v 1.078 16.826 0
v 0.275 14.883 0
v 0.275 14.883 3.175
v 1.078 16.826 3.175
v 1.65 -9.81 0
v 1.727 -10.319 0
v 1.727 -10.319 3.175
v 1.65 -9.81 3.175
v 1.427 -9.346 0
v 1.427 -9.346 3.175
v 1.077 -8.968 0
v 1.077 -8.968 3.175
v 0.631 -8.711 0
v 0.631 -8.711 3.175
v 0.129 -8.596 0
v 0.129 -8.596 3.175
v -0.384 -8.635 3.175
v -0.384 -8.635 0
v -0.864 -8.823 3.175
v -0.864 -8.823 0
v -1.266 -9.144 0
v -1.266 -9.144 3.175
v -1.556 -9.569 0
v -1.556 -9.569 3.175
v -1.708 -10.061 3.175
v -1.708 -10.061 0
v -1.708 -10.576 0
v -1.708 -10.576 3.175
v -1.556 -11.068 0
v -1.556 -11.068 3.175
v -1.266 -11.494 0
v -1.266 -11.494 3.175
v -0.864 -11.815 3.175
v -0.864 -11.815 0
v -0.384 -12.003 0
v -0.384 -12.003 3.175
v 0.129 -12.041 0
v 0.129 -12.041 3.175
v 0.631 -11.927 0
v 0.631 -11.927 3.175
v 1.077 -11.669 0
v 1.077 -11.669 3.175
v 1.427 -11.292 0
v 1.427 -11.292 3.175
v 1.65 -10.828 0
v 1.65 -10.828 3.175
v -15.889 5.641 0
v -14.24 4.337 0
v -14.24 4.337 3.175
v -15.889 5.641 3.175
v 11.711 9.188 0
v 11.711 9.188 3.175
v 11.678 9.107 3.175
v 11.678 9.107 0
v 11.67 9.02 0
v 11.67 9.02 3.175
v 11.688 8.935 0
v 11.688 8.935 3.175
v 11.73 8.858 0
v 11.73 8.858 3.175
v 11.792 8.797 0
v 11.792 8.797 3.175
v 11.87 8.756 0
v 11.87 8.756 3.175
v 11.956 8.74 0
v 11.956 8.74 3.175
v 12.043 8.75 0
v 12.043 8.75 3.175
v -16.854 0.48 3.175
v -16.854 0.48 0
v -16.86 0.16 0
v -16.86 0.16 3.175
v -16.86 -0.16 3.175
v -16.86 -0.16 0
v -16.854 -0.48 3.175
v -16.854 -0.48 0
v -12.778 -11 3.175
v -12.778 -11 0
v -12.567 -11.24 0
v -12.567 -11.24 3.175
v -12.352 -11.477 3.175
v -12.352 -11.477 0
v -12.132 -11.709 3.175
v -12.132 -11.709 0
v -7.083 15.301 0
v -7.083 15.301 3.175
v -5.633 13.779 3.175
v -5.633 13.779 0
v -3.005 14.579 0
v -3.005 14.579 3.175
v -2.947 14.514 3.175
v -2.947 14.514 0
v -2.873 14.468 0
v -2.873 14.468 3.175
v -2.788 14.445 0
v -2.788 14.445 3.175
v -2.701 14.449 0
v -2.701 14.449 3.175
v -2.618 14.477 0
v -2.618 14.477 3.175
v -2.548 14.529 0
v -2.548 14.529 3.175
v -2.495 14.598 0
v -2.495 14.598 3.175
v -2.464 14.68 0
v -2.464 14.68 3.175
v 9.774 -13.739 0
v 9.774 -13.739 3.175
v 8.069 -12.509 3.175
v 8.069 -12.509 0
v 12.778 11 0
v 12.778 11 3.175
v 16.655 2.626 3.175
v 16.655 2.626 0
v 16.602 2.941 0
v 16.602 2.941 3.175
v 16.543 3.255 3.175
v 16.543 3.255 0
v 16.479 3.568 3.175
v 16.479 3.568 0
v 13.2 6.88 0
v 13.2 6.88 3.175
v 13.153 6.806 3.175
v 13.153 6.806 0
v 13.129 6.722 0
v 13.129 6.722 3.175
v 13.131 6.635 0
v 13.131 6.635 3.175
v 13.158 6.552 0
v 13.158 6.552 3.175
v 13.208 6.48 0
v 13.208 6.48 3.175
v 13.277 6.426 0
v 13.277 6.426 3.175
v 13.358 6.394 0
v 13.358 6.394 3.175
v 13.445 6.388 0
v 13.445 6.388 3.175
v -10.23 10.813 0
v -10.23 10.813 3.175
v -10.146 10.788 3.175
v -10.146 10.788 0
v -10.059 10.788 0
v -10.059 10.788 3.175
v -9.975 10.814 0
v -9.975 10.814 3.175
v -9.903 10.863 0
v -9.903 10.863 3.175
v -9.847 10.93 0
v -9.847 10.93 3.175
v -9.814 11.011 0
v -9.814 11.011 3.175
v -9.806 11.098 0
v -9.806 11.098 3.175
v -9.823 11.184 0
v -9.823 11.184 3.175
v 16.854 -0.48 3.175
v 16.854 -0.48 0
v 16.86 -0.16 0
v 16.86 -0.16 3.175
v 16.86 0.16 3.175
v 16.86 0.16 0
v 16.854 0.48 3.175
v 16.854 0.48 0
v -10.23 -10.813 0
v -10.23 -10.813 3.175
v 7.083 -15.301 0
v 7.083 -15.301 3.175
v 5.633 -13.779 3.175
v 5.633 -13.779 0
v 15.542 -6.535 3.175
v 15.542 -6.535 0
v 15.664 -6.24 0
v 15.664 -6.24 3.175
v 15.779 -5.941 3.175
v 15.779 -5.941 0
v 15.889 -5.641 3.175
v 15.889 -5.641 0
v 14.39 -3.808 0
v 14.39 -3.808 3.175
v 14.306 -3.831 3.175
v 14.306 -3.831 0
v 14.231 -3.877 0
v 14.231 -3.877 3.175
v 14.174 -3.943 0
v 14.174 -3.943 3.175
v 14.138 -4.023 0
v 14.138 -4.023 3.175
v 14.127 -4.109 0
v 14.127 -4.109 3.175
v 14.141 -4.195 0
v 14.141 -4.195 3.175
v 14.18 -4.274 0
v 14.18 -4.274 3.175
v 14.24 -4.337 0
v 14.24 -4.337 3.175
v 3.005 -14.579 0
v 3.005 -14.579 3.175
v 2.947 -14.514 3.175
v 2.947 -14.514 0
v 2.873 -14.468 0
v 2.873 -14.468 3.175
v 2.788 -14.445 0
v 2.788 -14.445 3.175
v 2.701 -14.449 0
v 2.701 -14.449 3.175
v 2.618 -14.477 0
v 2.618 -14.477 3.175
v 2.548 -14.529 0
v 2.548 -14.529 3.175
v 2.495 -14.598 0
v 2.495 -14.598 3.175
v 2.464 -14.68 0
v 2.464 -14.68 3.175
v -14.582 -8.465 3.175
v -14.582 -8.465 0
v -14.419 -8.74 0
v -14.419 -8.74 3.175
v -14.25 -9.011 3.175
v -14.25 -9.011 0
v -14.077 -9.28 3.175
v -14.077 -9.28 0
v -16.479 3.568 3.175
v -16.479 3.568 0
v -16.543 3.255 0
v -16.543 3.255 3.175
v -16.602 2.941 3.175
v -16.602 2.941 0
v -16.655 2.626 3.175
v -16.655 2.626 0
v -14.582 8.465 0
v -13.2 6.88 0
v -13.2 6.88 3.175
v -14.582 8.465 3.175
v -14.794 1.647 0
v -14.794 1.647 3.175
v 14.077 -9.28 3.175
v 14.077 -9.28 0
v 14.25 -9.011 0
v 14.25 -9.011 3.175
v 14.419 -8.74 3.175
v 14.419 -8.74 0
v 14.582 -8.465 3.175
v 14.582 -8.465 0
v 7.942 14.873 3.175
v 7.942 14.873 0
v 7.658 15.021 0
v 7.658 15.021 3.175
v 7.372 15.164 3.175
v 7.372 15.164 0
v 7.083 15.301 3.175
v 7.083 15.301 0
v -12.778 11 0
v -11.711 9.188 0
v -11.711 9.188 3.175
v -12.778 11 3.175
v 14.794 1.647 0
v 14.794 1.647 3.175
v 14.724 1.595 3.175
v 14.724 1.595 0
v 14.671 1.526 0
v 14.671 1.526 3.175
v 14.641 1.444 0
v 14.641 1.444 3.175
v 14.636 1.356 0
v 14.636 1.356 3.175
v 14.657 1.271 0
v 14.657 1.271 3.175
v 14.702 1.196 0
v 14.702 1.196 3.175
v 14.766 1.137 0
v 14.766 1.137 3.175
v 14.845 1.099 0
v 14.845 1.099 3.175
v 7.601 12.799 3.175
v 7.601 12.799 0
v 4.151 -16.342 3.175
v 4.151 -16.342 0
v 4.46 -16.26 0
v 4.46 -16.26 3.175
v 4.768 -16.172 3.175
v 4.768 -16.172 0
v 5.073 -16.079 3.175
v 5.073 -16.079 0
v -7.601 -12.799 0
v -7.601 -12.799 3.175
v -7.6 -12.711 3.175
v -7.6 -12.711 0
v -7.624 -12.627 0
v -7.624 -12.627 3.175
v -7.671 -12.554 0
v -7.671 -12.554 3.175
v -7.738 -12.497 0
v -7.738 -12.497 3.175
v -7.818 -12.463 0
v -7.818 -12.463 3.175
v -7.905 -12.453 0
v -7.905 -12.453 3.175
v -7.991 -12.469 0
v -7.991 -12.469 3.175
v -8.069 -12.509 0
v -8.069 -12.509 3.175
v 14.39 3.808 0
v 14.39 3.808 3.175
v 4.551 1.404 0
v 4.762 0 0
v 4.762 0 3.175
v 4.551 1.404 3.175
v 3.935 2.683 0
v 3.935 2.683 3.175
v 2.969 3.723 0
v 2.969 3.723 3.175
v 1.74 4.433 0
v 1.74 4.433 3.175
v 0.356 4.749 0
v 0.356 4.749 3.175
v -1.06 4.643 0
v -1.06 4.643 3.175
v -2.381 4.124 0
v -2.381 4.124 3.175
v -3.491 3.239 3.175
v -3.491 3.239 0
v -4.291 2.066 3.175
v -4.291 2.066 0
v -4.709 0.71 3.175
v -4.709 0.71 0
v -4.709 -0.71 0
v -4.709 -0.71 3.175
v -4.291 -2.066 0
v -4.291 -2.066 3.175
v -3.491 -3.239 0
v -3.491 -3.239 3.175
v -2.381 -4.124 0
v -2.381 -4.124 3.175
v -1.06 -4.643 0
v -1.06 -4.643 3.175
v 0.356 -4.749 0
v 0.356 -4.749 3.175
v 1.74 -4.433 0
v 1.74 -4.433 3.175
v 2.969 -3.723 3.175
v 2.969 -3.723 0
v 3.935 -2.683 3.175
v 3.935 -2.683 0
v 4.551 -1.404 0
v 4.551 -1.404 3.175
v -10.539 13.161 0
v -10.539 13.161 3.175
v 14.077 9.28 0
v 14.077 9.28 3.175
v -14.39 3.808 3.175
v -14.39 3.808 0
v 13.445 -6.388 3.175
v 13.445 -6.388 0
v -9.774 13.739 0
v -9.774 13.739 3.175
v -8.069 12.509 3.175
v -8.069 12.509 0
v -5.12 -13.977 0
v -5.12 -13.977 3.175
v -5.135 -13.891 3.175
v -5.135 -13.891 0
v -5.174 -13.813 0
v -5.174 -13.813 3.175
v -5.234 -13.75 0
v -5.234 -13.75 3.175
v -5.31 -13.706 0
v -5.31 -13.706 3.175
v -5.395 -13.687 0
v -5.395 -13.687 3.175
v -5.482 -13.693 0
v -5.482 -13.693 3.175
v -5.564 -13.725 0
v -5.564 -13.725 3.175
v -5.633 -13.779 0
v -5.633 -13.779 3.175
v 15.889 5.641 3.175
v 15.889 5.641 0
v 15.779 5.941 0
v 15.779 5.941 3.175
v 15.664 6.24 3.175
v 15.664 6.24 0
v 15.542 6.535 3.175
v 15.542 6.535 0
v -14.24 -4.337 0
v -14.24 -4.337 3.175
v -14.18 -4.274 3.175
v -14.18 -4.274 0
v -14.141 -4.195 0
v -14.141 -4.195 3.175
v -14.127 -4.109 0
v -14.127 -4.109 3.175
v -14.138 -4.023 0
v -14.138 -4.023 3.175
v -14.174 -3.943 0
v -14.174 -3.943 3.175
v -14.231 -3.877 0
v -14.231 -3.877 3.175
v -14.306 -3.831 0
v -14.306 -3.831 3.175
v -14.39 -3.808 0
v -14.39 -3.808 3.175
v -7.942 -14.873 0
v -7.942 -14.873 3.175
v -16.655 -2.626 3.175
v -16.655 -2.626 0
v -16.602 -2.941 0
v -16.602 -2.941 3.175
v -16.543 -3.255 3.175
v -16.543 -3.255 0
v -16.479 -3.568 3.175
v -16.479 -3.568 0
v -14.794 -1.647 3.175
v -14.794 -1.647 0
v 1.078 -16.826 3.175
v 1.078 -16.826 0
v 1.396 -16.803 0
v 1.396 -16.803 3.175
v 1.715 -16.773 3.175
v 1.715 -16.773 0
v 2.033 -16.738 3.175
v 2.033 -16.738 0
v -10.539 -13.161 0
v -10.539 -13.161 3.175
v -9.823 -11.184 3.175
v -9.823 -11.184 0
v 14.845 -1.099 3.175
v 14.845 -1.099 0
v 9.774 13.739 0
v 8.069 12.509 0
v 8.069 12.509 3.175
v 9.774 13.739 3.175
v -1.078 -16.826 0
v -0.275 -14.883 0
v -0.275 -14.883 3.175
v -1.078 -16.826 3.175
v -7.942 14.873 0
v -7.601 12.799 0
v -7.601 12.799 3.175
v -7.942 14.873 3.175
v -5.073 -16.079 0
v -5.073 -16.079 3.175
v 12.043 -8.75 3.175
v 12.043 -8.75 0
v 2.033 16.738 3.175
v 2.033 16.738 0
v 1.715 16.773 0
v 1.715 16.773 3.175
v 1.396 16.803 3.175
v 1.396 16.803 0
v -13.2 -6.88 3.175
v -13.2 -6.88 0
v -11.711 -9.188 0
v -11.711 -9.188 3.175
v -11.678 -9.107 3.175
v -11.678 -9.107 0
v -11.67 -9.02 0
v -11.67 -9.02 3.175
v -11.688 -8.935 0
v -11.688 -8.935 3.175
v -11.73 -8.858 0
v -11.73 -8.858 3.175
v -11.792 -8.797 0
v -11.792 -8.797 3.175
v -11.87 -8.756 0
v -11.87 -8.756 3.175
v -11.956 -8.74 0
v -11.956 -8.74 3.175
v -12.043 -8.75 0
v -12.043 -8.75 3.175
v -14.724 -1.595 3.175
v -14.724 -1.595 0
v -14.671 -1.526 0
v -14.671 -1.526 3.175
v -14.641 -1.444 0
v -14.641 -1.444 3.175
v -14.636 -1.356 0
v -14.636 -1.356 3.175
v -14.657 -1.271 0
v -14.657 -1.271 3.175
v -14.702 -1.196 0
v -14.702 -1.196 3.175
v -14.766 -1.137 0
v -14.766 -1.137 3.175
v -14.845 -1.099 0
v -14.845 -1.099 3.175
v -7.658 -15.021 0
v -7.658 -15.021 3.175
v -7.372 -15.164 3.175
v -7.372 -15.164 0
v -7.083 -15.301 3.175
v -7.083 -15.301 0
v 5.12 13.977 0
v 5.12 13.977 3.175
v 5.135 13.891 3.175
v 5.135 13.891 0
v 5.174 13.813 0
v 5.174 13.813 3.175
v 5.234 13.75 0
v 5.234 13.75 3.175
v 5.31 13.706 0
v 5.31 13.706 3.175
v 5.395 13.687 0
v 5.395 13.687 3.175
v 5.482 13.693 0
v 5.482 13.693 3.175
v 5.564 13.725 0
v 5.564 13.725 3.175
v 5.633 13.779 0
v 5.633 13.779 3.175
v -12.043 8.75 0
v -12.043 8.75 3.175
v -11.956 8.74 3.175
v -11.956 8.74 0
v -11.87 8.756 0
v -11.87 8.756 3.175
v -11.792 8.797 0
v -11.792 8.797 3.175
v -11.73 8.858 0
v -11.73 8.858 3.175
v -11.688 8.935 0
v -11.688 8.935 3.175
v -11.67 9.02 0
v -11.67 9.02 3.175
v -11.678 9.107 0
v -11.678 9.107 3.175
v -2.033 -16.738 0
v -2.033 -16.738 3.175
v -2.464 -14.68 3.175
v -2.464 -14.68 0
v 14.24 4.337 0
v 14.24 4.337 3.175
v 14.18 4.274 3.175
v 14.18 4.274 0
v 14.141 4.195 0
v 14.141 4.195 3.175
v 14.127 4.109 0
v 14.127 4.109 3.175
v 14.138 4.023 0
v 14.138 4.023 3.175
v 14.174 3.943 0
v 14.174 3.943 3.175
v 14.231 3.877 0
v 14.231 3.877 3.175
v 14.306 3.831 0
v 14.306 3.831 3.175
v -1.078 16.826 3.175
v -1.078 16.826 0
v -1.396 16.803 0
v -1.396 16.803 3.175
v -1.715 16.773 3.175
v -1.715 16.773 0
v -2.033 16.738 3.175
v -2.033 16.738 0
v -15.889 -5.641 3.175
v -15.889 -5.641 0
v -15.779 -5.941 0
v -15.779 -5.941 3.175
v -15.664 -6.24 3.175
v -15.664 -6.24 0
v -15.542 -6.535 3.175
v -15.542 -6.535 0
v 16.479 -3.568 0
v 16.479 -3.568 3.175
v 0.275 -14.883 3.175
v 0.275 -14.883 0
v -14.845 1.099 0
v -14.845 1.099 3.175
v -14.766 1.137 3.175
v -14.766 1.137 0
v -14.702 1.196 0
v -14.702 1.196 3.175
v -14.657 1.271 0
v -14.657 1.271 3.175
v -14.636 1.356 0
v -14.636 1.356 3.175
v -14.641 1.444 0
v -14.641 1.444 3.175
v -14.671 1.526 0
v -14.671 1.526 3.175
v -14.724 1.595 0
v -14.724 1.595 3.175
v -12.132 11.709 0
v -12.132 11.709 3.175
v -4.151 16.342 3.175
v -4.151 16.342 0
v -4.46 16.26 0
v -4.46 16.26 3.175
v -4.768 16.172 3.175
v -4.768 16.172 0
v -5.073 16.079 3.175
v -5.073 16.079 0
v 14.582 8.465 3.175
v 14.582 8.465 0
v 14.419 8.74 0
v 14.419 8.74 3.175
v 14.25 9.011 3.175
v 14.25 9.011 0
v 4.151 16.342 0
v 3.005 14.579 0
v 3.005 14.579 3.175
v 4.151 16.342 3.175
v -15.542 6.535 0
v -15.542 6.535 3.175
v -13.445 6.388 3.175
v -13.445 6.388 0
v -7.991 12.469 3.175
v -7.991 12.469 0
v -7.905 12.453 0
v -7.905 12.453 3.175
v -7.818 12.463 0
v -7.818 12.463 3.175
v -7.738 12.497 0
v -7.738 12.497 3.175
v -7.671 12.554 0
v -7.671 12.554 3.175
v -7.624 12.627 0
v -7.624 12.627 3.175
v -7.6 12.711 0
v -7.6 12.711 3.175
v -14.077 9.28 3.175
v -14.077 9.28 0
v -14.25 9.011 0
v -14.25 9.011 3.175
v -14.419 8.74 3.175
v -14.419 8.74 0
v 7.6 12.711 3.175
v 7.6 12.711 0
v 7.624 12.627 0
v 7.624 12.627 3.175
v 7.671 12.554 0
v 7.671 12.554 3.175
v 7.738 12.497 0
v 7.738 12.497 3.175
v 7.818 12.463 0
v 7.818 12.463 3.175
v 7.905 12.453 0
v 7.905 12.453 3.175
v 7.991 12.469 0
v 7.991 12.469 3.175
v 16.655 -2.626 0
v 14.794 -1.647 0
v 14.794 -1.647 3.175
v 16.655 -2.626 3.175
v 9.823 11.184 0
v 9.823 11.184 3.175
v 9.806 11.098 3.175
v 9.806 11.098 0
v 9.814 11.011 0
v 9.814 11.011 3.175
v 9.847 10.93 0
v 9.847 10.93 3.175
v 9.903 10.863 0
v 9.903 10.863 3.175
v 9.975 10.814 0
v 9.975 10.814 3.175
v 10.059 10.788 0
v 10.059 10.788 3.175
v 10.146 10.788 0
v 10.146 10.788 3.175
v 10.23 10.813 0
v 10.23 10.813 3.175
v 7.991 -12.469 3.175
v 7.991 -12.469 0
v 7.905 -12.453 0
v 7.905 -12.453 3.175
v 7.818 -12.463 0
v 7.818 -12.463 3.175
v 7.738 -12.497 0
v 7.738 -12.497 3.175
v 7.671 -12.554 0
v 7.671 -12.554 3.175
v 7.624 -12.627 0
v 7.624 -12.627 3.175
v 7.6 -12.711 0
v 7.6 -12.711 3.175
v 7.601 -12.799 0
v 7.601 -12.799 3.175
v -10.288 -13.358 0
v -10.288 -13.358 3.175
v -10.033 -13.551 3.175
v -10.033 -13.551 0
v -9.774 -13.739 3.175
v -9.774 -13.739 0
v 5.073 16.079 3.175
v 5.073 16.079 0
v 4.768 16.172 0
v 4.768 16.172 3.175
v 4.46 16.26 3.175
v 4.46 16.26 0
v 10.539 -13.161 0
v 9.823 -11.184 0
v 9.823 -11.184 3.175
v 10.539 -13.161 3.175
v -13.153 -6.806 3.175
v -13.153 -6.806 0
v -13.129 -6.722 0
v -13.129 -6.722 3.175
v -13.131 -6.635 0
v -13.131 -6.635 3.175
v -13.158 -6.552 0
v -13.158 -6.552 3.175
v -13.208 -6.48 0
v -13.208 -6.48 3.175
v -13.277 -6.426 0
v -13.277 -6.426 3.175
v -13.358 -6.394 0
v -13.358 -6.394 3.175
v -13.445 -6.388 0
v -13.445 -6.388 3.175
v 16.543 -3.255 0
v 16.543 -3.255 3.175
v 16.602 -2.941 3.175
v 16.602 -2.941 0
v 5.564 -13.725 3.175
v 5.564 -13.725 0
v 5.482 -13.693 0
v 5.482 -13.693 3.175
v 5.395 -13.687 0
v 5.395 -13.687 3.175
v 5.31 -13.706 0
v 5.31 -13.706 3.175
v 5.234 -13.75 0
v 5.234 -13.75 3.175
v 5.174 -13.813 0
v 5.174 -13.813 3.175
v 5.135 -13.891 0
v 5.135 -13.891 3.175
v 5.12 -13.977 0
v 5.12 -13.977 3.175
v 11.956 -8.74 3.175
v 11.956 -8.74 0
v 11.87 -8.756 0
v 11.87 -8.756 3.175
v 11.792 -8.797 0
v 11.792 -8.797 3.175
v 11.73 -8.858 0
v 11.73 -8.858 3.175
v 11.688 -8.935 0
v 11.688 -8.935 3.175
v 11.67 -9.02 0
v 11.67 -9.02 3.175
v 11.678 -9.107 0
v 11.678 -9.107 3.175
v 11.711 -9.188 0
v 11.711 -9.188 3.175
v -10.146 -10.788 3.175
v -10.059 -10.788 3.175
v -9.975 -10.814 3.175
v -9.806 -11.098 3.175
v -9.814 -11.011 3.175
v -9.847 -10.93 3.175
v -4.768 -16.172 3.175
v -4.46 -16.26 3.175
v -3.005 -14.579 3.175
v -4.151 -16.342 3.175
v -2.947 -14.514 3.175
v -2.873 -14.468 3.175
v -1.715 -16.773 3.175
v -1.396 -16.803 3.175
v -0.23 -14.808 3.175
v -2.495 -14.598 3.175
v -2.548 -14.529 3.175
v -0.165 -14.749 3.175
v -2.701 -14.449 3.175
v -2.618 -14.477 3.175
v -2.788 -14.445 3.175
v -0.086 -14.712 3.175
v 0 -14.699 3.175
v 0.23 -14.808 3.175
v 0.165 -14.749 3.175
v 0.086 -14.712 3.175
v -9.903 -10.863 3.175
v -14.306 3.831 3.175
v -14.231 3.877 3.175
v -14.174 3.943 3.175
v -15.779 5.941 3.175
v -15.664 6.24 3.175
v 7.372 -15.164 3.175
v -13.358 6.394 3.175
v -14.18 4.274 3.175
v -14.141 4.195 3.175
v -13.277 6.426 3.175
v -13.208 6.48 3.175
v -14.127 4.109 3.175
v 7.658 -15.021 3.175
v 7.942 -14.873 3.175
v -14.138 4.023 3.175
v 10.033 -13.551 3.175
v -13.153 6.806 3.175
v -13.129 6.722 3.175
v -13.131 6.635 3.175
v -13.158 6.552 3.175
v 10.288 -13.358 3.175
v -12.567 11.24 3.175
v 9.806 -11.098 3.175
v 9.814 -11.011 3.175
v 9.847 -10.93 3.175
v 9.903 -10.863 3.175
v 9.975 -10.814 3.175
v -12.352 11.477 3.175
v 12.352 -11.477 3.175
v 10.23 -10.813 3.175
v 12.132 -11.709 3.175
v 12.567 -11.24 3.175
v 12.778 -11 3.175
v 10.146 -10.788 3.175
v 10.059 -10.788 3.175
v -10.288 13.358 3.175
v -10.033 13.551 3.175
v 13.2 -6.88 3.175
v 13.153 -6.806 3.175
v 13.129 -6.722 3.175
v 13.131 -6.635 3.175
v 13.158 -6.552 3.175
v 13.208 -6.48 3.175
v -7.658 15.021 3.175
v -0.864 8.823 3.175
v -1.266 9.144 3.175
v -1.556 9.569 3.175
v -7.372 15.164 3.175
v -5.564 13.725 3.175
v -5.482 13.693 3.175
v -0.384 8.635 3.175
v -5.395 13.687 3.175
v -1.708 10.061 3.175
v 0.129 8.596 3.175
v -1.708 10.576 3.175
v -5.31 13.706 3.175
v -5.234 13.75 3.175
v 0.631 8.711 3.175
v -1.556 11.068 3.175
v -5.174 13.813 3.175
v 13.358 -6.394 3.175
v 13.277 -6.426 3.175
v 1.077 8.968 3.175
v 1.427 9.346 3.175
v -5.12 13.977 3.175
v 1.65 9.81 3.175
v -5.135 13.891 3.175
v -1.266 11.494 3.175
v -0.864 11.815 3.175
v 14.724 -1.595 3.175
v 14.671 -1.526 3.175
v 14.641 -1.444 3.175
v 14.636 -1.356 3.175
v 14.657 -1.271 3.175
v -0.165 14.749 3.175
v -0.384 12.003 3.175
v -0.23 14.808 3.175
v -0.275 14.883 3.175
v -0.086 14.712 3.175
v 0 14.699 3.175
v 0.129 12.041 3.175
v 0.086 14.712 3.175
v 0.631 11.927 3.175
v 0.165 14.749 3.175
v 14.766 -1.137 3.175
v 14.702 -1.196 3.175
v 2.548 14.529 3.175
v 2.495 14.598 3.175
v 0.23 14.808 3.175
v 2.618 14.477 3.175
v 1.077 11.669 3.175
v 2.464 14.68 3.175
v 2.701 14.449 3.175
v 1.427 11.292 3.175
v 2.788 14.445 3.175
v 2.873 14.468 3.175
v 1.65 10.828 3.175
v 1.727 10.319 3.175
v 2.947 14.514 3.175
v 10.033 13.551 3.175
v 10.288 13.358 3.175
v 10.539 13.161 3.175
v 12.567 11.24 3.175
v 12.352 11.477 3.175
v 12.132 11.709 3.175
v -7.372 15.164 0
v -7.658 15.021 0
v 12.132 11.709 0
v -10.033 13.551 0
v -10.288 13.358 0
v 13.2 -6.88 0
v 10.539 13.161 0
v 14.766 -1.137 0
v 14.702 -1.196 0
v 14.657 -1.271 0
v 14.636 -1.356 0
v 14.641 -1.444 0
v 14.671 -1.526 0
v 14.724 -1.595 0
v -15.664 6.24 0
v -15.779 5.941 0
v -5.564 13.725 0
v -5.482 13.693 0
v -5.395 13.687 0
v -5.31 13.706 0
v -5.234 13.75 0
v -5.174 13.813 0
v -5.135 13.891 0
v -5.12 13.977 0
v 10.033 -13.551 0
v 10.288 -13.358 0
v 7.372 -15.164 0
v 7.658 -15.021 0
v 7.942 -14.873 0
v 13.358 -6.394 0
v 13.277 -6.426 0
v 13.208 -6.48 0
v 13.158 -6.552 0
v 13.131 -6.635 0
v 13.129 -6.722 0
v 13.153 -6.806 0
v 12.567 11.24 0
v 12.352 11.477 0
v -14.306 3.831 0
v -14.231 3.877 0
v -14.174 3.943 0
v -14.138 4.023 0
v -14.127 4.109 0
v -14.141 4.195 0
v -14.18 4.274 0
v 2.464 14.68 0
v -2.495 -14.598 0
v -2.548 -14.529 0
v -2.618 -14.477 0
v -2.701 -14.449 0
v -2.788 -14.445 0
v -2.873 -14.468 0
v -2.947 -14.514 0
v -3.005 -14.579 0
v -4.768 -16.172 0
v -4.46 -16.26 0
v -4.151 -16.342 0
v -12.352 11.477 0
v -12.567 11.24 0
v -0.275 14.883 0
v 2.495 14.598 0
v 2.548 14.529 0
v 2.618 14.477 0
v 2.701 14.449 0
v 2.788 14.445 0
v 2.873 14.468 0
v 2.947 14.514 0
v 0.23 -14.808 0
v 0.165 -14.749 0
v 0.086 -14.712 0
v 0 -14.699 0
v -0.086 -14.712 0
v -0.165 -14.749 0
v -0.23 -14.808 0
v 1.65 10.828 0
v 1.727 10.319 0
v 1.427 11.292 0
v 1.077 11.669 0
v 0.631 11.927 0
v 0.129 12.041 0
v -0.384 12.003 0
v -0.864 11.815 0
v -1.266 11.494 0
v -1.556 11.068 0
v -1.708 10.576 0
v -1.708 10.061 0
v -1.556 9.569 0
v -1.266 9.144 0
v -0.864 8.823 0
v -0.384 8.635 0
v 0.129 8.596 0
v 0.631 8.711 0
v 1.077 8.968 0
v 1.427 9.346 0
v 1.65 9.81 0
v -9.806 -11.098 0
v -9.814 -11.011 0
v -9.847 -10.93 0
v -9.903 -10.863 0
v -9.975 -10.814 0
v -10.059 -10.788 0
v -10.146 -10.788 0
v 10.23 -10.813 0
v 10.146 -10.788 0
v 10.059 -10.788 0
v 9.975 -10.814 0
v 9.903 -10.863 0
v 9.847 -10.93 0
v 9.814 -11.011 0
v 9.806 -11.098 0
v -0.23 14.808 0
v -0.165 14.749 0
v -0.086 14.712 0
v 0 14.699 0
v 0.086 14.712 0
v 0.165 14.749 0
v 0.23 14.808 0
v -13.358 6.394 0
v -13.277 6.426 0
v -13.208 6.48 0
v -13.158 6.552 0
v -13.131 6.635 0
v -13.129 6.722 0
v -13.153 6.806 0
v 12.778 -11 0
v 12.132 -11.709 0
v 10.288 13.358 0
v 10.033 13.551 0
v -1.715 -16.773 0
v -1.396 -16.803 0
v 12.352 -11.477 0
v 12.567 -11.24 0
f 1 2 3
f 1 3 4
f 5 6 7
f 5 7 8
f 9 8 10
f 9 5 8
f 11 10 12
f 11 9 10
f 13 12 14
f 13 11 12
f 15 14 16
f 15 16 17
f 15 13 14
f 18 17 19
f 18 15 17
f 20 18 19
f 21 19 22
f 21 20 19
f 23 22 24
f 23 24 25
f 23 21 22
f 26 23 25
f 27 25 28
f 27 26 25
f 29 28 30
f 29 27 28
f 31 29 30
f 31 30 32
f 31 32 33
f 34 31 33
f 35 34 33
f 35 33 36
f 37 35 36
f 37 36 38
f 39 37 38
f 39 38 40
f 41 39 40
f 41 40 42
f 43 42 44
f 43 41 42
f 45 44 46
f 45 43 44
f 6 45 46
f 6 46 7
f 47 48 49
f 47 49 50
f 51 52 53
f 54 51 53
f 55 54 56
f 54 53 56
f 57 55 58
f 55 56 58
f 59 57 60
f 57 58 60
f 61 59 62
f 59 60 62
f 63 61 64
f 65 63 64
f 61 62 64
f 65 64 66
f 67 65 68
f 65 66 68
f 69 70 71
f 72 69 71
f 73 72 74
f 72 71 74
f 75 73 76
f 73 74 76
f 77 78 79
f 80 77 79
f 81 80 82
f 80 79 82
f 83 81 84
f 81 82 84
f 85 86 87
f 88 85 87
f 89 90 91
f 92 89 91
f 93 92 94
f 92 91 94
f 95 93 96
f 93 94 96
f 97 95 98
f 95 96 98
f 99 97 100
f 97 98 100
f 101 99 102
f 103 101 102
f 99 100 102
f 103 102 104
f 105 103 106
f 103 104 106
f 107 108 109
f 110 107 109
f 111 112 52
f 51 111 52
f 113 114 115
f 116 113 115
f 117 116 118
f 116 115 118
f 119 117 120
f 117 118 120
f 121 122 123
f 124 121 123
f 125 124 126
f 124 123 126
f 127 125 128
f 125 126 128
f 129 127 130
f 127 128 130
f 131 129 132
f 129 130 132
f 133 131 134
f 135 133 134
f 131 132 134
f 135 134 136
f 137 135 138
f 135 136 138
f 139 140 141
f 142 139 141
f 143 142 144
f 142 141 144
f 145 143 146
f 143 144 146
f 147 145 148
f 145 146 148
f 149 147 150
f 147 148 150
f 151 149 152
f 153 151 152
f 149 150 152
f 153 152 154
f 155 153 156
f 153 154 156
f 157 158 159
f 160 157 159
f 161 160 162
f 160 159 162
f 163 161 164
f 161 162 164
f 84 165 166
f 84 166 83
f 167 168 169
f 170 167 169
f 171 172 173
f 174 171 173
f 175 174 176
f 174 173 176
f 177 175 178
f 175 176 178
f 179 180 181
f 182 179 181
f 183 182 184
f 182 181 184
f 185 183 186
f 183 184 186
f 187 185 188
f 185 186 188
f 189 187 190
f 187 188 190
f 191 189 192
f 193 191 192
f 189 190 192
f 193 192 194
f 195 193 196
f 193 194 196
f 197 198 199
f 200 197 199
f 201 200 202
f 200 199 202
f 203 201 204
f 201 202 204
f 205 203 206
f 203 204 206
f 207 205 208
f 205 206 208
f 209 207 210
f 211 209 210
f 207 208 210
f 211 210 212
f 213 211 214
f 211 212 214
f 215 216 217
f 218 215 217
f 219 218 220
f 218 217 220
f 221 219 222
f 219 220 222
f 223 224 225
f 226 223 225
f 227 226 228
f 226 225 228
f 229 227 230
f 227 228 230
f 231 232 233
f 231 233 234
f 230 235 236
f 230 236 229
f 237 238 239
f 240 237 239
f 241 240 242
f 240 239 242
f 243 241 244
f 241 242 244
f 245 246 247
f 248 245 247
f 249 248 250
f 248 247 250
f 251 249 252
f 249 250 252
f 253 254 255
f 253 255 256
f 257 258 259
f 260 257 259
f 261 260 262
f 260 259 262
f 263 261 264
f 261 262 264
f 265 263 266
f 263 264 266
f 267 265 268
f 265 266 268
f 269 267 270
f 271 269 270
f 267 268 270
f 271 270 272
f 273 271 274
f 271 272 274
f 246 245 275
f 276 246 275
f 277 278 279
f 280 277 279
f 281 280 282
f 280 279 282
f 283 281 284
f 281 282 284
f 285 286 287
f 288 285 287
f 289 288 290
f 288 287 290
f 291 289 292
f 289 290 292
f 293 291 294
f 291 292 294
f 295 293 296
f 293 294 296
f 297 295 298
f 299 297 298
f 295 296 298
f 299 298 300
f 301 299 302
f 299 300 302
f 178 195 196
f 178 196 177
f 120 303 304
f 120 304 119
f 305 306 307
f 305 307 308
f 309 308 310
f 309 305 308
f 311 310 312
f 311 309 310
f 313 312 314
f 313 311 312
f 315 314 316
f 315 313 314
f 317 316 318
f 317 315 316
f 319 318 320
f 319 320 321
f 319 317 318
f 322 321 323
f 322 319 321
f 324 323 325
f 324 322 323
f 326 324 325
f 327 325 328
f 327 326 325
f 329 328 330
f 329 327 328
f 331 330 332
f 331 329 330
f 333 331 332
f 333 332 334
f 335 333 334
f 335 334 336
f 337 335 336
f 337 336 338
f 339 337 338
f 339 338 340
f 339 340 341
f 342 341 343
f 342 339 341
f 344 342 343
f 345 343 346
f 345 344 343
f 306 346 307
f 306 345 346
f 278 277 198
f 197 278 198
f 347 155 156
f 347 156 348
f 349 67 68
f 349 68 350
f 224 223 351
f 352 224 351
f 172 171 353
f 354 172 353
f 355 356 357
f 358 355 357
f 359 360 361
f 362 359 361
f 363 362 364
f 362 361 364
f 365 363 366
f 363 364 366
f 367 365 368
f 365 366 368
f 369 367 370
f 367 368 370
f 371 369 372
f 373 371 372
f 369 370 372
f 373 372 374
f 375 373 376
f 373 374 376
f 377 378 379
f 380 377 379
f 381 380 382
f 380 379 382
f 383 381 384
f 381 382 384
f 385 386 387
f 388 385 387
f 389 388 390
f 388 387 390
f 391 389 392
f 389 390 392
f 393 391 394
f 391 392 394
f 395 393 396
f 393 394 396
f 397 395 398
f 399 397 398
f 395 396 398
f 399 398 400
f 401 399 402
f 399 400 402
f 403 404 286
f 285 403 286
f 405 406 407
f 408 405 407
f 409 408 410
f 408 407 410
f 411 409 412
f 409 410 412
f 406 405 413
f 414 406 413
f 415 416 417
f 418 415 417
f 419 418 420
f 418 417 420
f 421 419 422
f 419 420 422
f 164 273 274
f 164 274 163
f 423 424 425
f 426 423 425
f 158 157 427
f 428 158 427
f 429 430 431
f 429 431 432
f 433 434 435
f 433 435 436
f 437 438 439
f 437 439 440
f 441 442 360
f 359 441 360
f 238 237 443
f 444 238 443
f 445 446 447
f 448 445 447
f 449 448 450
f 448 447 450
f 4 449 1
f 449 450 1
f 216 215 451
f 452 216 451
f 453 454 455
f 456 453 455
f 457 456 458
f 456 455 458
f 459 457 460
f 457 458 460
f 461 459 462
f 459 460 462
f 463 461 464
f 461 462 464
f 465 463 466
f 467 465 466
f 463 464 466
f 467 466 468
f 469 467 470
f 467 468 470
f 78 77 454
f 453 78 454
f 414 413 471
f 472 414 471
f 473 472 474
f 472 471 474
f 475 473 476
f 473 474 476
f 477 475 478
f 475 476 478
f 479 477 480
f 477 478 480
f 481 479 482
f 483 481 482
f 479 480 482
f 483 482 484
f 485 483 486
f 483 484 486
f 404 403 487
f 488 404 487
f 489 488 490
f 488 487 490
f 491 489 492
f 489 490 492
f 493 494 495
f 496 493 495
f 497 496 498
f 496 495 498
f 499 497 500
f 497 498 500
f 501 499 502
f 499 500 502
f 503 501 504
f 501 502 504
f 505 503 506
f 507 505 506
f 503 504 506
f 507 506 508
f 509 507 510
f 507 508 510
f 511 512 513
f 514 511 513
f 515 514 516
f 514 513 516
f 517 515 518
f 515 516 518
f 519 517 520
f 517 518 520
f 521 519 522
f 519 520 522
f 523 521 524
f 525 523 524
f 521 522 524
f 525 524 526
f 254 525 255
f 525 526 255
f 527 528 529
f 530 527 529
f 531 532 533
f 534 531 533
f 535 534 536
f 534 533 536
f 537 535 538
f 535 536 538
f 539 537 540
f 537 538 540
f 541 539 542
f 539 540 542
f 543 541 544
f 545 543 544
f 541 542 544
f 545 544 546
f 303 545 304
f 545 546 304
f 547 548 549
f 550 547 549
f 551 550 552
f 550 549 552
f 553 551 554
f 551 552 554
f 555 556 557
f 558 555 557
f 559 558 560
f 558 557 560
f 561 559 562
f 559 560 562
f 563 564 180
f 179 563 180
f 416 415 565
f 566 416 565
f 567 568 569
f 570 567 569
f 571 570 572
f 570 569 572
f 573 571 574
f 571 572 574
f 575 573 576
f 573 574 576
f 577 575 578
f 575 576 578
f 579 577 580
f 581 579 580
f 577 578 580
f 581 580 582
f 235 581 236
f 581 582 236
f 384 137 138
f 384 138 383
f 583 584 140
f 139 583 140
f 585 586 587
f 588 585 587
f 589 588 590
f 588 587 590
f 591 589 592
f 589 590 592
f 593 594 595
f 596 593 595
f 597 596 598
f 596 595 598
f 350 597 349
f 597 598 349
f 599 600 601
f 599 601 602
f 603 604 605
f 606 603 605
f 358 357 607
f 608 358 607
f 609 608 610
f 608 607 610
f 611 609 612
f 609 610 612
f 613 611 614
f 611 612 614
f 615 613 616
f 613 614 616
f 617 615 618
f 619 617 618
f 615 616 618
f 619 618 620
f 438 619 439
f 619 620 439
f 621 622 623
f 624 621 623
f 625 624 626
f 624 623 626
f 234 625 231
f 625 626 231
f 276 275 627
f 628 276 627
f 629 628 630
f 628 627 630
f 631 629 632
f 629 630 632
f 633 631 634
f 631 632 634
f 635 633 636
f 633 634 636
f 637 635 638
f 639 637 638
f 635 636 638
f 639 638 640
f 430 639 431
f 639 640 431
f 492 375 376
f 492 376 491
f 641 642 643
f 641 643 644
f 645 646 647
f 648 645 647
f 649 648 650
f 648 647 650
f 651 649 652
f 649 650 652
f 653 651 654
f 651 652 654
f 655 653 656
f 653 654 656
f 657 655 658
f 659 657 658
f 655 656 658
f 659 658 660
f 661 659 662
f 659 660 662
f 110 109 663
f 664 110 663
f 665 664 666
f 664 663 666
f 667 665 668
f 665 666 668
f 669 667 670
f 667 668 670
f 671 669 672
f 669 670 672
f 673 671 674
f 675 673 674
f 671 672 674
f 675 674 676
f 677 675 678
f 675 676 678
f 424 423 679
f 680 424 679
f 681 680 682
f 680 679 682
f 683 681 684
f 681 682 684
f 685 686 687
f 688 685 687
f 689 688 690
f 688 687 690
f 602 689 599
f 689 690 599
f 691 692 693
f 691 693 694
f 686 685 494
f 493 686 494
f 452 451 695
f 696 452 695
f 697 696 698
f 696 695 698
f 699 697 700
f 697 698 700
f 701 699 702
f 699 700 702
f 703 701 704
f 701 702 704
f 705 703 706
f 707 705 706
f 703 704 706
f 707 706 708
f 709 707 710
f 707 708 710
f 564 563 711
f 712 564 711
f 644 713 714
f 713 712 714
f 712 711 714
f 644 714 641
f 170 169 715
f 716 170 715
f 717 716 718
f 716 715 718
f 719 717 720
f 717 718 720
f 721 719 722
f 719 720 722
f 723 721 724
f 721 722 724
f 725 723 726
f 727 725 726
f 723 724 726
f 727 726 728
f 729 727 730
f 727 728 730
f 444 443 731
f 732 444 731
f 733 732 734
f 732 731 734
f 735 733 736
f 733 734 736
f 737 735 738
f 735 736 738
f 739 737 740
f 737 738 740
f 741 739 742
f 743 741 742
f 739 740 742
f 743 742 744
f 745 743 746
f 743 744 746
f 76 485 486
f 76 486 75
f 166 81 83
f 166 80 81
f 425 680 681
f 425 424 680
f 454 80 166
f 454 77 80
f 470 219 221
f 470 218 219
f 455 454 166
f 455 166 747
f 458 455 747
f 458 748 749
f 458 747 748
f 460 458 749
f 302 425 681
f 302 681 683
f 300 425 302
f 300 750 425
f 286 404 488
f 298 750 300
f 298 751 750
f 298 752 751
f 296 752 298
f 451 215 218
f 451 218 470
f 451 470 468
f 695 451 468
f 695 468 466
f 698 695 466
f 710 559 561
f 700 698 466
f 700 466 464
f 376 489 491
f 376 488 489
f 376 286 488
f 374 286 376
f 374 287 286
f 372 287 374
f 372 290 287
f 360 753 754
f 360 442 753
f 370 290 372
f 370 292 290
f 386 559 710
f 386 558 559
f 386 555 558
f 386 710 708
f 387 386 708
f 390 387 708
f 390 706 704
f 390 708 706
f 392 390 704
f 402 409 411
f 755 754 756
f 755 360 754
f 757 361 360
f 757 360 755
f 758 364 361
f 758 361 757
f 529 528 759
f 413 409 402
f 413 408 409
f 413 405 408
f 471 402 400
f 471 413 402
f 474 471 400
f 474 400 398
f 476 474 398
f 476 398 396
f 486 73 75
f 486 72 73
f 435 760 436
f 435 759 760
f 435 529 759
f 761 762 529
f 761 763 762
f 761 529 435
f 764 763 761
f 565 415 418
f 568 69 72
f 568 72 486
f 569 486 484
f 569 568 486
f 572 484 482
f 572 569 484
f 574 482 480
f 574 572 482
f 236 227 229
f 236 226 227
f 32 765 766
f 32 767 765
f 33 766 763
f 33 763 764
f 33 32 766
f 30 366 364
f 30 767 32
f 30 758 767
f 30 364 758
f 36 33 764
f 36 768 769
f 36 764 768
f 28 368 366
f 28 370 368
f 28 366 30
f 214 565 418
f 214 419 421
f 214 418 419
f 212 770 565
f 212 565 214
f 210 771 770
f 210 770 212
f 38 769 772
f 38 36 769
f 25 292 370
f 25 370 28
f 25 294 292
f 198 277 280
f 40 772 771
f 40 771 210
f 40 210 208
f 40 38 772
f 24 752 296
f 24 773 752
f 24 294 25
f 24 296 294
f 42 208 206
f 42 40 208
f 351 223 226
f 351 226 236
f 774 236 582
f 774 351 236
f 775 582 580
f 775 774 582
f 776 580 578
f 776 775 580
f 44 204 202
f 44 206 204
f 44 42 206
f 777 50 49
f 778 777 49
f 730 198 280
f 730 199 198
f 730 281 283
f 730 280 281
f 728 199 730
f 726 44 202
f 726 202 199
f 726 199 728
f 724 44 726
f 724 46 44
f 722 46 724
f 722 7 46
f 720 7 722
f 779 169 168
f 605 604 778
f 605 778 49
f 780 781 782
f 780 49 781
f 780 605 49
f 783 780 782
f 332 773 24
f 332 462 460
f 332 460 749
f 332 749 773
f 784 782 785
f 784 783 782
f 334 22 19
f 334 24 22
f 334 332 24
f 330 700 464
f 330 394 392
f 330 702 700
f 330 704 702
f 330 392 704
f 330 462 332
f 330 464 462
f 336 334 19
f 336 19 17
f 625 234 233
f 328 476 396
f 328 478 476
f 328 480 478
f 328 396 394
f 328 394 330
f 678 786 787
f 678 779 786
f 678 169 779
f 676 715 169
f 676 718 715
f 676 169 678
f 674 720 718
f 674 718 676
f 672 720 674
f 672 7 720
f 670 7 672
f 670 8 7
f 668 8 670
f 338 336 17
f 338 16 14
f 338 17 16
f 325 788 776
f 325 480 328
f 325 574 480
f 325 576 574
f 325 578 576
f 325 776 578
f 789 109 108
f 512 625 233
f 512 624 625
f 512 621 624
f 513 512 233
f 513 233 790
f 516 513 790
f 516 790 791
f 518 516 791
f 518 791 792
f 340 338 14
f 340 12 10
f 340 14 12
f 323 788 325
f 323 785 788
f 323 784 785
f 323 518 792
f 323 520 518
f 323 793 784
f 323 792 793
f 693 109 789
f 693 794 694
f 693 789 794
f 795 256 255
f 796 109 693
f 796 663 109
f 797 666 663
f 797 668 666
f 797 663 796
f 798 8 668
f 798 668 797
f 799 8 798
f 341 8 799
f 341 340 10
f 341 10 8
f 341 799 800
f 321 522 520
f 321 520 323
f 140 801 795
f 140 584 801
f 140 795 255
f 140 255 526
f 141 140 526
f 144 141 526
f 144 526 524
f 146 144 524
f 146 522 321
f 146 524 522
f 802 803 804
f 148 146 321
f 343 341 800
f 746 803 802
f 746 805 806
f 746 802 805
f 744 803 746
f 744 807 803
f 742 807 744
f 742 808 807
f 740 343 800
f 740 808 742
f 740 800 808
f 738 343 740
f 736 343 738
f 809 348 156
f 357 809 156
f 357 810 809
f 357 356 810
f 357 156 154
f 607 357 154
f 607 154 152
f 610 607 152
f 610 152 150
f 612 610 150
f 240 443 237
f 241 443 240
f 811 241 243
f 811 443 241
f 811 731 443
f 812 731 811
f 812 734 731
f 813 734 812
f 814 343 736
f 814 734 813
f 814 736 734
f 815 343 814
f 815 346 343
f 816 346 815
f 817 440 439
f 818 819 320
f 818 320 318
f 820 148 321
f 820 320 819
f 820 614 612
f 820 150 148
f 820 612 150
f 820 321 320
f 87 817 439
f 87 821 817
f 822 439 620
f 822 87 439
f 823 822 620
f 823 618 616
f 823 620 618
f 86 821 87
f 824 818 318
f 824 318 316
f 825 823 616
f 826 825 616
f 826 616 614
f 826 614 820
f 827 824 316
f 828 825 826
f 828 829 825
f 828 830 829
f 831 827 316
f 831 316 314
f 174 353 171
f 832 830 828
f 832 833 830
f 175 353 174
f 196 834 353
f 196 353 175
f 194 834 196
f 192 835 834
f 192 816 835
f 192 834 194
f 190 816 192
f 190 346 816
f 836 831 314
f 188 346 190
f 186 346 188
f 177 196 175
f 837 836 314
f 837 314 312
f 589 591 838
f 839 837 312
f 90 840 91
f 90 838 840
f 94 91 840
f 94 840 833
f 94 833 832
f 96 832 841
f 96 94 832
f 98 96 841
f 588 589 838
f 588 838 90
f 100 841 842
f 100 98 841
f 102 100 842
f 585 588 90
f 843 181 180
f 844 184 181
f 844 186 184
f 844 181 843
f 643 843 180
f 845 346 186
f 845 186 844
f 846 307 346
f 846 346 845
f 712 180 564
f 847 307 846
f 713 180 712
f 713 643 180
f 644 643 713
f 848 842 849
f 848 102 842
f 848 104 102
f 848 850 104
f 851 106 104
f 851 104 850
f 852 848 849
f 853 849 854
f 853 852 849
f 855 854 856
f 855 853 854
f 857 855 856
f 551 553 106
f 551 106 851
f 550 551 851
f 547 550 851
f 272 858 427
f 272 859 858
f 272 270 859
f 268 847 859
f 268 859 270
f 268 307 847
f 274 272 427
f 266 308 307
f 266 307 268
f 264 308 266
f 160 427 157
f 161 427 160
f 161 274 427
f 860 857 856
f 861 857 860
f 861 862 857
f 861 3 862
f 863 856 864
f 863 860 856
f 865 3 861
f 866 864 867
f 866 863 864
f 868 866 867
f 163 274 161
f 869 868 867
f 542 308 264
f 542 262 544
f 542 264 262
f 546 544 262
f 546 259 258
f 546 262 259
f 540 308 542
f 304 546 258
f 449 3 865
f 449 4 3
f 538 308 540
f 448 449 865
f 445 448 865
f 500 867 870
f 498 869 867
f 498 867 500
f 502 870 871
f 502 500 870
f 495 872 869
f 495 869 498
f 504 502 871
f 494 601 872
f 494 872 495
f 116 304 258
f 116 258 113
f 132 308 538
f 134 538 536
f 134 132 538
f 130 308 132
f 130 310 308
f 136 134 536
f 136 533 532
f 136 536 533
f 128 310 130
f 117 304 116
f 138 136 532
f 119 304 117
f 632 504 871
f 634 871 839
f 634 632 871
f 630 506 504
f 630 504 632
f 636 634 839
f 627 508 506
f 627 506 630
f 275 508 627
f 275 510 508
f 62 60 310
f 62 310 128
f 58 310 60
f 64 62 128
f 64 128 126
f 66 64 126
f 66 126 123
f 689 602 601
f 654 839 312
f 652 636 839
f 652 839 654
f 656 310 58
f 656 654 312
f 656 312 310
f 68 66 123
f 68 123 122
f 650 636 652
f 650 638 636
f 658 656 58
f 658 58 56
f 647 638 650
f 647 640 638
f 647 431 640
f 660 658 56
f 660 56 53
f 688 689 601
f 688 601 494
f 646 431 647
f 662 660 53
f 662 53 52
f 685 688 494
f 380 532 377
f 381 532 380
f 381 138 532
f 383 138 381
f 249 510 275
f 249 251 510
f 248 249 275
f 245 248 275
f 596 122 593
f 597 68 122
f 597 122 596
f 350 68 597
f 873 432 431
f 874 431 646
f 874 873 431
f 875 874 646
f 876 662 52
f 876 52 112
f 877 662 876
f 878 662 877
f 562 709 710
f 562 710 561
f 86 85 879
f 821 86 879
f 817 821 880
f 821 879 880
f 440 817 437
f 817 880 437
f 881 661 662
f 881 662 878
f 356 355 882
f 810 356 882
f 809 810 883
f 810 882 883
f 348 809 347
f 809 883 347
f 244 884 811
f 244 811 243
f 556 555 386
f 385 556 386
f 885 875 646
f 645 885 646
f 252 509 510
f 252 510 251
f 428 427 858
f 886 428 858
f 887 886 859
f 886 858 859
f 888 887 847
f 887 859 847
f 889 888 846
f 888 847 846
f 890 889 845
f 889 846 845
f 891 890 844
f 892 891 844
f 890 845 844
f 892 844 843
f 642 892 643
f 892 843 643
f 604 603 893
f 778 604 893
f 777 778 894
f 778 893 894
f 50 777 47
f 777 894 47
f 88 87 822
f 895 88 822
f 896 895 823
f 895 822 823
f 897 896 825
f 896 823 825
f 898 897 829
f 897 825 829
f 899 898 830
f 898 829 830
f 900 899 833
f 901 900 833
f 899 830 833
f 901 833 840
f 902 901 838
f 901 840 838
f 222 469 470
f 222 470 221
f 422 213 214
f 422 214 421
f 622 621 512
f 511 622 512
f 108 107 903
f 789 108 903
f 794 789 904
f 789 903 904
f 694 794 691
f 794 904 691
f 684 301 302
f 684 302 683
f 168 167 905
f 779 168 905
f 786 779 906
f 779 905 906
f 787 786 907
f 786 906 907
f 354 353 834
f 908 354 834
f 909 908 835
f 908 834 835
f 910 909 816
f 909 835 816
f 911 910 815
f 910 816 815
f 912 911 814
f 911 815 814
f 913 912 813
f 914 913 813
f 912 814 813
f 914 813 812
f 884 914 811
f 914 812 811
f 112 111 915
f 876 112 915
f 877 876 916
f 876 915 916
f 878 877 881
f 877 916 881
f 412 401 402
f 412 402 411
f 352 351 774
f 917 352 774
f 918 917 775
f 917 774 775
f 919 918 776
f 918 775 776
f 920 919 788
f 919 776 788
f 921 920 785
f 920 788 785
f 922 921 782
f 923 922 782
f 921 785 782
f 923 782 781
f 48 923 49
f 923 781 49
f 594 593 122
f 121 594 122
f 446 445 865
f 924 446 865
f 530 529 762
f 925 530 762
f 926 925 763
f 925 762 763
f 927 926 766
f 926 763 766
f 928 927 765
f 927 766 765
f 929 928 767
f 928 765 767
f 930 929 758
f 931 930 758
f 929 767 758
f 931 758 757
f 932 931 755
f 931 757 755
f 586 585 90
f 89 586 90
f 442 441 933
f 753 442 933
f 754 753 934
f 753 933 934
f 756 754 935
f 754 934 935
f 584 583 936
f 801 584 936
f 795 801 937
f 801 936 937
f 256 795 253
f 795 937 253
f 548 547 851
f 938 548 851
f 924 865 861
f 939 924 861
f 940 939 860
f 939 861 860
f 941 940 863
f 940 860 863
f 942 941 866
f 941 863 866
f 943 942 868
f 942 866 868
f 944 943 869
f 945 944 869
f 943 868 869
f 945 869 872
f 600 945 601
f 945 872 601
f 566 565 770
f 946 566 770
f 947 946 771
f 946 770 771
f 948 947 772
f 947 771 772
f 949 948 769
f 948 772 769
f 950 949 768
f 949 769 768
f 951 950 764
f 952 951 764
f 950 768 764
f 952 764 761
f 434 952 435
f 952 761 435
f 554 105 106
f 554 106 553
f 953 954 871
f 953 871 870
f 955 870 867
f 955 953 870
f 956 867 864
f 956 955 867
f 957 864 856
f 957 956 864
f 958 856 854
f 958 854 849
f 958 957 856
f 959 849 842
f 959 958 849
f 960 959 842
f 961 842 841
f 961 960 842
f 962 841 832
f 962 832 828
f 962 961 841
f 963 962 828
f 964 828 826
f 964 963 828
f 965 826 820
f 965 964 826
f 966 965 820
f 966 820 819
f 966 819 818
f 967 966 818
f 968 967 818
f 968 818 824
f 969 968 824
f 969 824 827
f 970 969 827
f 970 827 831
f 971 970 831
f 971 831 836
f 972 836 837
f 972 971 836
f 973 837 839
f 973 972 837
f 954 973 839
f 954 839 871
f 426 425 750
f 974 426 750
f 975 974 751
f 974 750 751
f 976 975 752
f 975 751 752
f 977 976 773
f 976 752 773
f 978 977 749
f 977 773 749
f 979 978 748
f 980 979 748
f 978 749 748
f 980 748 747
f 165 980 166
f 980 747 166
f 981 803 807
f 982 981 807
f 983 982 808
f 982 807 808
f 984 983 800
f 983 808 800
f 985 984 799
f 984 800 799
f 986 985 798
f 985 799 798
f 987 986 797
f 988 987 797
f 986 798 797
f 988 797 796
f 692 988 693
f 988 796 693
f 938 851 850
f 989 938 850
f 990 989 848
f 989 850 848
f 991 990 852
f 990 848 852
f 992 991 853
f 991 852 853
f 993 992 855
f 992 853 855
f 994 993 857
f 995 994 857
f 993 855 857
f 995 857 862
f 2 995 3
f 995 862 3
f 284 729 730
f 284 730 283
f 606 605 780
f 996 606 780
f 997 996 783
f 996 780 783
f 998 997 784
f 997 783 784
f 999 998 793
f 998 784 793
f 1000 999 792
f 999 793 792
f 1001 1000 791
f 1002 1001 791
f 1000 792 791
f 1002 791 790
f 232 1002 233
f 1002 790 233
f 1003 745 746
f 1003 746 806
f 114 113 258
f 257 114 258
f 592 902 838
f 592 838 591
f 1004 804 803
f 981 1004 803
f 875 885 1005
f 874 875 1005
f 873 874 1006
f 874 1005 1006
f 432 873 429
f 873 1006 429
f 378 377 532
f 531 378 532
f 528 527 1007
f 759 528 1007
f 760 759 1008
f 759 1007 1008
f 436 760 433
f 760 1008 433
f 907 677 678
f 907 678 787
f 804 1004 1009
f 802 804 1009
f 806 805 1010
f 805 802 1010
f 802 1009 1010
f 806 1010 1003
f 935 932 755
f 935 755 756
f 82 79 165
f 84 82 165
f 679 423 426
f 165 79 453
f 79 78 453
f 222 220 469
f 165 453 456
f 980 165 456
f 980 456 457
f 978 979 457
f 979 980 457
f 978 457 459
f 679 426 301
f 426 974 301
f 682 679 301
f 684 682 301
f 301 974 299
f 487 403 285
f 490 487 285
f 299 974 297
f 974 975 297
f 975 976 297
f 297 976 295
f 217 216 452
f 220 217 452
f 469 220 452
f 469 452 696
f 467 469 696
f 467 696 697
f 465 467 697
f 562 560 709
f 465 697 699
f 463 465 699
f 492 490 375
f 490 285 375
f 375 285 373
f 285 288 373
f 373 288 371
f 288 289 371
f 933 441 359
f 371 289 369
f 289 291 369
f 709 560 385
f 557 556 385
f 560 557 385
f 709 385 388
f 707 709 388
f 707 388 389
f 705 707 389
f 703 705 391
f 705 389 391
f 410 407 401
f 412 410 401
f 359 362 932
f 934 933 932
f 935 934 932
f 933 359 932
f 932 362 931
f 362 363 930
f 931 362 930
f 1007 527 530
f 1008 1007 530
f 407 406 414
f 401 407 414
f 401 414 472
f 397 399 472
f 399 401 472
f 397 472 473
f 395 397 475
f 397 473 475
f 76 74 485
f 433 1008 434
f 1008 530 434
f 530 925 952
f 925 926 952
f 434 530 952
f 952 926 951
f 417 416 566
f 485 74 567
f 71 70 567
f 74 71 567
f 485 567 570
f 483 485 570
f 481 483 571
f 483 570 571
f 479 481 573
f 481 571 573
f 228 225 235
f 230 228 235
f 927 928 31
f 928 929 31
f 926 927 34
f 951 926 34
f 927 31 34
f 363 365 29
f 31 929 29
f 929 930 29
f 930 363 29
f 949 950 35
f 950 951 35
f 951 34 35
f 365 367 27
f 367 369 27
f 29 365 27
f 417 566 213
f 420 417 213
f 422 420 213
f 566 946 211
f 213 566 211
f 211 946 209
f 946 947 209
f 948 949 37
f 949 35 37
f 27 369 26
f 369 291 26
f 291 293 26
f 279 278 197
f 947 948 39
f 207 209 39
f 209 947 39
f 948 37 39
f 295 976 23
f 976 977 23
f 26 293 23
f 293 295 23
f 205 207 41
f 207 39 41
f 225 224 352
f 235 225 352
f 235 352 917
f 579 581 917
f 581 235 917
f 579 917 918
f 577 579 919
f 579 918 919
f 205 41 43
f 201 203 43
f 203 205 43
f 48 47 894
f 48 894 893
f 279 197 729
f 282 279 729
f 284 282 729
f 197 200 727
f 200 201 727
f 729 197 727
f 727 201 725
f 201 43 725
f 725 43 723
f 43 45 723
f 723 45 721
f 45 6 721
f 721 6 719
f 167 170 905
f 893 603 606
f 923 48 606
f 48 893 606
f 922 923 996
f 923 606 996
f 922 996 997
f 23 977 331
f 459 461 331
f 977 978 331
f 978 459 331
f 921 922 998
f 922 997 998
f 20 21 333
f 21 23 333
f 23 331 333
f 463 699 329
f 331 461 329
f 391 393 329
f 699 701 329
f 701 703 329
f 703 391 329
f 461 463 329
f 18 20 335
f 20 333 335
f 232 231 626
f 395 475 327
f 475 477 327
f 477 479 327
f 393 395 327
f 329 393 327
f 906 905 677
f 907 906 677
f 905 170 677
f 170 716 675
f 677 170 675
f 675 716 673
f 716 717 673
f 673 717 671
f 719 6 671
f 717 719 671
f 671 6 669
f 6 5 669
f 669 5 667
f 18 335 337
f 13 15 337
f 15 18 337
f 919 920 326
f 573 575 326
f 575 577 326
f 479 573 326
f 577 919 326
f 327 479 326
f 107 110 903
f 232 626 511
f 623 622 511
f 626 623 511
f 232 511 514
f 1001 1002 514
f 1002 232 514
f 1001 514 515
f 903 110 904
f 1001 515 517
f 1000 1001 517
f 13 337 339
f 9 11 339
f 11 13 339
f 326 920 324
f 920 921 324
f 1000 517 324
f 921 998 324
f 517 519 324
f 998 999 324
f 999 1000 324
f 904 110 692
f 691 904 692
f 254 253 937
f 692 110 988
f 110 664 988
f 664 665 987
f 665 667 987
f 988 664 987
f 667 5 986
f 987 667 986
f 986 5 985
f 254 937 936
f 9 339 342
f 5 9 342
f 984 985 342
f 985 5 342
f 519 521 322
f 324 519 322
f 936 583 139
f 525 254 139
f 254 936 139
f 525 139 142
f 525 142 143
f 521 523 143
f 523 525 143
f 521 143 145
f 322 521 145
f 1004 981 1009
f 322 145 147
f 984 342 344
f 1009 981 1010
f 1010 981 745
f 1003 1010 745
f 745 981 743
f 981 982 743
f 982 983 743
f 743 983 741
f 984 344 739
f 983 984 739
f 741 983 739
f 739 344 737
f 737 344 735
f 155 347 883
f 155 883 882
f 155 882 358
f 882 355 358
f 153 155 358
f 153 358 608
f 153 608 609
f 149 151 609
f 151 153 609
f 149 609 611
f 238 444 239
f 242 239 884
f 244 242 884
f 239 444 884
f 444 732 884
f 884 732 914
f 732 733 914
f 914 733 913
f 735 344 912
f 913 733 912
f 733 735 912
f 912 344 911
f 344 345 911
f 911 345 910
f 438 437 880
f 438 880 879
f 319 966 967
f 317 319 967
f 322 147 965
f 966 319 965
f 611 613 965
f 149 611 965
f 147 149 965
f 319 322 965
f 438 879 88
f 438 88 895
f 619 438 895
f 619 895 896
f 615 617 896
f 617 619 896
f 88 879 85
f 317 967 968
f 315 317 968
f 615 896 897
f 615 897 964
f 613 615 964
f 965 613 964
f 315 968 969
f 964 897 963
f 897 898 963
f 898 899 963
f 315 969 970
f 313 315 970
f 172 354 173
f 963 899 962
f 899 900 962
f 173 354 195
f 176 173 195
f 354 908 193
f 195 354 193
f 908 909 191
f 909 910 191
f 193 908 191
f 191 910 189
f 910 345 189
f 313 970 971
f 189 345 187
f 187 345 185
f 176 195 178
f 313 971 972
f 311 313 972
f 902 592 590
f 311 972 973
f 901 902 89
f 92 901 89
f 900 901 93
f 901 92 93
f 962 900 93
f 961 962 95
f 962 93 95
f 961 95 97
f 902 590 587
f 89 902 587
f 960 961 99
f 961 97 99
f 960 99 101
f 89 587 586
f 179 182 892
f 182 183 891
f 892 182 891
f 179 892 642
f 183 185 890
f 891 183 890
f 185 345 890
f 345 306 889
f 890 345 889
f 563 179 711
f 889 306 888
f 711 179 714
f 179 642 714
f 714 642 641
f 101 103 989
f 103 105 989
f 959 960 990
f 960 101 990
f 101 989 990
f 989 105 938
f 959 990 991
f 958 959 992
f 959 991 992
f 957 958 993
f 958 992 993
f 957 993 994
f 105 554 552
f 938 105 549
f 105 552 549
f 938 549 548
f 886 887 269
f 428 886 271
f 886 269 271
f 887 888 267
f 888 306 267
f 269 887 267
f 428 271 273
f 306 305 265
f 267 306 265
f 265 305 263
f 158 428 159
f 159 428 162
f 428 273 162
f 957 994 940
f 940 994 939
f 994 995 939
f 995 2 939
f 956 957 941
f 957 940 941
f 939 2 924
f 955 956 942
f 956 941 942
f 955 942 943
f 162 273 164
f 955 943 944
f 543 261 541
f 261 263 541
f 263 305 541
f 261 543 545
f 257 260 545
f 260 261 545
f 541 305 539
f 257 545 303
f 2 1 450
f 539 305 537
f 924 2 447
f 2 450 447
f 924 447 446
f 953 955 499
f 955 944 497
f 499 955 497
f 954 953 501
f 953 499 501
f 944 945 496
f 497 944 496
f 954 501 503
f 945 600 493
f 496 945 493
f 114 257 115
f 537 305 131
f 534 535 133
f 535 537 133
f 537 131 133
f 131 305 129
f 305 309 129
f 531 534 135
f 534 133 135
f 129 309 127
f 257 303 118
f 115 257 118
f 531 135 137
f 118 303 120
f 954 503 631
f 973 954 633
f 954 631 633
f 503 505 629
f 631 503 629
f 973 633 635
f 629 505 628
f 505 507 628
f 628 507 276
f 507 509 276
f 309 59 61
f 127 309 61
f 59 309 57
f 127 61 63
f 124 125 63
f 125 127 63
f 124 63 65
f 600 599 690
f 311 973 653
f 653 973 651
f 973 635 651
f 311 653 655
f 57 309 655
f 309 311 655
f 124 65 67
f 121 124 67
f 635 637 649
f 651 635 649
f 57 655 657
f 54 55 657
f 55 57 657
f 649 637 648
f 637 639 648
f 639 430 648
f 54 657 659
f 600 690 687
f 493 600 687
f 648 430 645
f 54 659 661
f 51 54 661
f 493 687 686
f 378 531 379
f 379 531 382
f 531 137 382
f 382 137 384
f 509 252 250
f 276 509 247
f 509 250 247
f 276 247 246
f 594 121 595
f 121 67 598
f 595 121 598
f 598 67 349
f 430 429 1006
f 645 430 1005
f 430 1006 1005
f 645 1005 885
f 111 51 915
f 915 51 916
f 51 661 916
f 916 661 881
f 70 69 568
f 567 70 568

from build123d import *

# Parameters (mm, degrees)
F0_R            = 16.8606013276
F0_R_2          = 1.7272
F0_R_3          = 4.7625
F1_DEPTH        = 3.175
F3_DEPTH        = 3.175
F3_COPIES_COUNT = 34


# Not quite as in the source:
# - a pattern or mirror of a feature is missing from the dataset's text; its kind, count and spacing are read off the source's solid
# - a feature names something its author has since deleted; it is built from what else it names


with BuildPart() as f1:
    # F0 (on Top) → F1 (new body)
    with BuildSketch(Plane.XY):
        Circle(F0_R)
        with Locations((0, -10.31875)):
            Circle(F0_R_2, mode=Mode.SUBTRACT)
        Circle(F0_R_3, mode=Mode.SUBTRACT)
        with Locations((0, 10.31875)):
            Circle(F0_R_2, mode=Mode.SUBTRACT)
    extrude(amount=F1_DEPTH)

    # F2 (on face) → F3 (cut, through all)
    with BuildSketch(Plane.XY.offset(3.175)):
        with BuildLine():
            Line((0.2750051008, 14.882965874), (1.0776094804, 16.8261295293))
            ThreePointArc((1.0776094804, 16.8261295293), (0, 16.8606013276), (-1.0776094804, 16.8261295293))
            Line((-1.0776094804, 16.8261295293), (-0.2750051008, 14.882965874))
            ThreePointArc((-0.2750051008, 14.882965874), (0, 14.6990139664), (0.2750051008, 14.882965874))
        make_face()
    f3 = extrude(amount=-F3_DEPTH, mode=Mode.SUBTRACT)

    # F3_copies: F3 ×34 about axis
    f3_copies_axis = Axis((0, 0, 0), (0, 0, 1))
    for i in range(1, F3_COPIES_COUNT):
        add(f3.rotate(f3_copies_axis, i * 360 / F3_COPIES_COUNT), mode=Mode.SUBTRACT)


solid = f1.part
